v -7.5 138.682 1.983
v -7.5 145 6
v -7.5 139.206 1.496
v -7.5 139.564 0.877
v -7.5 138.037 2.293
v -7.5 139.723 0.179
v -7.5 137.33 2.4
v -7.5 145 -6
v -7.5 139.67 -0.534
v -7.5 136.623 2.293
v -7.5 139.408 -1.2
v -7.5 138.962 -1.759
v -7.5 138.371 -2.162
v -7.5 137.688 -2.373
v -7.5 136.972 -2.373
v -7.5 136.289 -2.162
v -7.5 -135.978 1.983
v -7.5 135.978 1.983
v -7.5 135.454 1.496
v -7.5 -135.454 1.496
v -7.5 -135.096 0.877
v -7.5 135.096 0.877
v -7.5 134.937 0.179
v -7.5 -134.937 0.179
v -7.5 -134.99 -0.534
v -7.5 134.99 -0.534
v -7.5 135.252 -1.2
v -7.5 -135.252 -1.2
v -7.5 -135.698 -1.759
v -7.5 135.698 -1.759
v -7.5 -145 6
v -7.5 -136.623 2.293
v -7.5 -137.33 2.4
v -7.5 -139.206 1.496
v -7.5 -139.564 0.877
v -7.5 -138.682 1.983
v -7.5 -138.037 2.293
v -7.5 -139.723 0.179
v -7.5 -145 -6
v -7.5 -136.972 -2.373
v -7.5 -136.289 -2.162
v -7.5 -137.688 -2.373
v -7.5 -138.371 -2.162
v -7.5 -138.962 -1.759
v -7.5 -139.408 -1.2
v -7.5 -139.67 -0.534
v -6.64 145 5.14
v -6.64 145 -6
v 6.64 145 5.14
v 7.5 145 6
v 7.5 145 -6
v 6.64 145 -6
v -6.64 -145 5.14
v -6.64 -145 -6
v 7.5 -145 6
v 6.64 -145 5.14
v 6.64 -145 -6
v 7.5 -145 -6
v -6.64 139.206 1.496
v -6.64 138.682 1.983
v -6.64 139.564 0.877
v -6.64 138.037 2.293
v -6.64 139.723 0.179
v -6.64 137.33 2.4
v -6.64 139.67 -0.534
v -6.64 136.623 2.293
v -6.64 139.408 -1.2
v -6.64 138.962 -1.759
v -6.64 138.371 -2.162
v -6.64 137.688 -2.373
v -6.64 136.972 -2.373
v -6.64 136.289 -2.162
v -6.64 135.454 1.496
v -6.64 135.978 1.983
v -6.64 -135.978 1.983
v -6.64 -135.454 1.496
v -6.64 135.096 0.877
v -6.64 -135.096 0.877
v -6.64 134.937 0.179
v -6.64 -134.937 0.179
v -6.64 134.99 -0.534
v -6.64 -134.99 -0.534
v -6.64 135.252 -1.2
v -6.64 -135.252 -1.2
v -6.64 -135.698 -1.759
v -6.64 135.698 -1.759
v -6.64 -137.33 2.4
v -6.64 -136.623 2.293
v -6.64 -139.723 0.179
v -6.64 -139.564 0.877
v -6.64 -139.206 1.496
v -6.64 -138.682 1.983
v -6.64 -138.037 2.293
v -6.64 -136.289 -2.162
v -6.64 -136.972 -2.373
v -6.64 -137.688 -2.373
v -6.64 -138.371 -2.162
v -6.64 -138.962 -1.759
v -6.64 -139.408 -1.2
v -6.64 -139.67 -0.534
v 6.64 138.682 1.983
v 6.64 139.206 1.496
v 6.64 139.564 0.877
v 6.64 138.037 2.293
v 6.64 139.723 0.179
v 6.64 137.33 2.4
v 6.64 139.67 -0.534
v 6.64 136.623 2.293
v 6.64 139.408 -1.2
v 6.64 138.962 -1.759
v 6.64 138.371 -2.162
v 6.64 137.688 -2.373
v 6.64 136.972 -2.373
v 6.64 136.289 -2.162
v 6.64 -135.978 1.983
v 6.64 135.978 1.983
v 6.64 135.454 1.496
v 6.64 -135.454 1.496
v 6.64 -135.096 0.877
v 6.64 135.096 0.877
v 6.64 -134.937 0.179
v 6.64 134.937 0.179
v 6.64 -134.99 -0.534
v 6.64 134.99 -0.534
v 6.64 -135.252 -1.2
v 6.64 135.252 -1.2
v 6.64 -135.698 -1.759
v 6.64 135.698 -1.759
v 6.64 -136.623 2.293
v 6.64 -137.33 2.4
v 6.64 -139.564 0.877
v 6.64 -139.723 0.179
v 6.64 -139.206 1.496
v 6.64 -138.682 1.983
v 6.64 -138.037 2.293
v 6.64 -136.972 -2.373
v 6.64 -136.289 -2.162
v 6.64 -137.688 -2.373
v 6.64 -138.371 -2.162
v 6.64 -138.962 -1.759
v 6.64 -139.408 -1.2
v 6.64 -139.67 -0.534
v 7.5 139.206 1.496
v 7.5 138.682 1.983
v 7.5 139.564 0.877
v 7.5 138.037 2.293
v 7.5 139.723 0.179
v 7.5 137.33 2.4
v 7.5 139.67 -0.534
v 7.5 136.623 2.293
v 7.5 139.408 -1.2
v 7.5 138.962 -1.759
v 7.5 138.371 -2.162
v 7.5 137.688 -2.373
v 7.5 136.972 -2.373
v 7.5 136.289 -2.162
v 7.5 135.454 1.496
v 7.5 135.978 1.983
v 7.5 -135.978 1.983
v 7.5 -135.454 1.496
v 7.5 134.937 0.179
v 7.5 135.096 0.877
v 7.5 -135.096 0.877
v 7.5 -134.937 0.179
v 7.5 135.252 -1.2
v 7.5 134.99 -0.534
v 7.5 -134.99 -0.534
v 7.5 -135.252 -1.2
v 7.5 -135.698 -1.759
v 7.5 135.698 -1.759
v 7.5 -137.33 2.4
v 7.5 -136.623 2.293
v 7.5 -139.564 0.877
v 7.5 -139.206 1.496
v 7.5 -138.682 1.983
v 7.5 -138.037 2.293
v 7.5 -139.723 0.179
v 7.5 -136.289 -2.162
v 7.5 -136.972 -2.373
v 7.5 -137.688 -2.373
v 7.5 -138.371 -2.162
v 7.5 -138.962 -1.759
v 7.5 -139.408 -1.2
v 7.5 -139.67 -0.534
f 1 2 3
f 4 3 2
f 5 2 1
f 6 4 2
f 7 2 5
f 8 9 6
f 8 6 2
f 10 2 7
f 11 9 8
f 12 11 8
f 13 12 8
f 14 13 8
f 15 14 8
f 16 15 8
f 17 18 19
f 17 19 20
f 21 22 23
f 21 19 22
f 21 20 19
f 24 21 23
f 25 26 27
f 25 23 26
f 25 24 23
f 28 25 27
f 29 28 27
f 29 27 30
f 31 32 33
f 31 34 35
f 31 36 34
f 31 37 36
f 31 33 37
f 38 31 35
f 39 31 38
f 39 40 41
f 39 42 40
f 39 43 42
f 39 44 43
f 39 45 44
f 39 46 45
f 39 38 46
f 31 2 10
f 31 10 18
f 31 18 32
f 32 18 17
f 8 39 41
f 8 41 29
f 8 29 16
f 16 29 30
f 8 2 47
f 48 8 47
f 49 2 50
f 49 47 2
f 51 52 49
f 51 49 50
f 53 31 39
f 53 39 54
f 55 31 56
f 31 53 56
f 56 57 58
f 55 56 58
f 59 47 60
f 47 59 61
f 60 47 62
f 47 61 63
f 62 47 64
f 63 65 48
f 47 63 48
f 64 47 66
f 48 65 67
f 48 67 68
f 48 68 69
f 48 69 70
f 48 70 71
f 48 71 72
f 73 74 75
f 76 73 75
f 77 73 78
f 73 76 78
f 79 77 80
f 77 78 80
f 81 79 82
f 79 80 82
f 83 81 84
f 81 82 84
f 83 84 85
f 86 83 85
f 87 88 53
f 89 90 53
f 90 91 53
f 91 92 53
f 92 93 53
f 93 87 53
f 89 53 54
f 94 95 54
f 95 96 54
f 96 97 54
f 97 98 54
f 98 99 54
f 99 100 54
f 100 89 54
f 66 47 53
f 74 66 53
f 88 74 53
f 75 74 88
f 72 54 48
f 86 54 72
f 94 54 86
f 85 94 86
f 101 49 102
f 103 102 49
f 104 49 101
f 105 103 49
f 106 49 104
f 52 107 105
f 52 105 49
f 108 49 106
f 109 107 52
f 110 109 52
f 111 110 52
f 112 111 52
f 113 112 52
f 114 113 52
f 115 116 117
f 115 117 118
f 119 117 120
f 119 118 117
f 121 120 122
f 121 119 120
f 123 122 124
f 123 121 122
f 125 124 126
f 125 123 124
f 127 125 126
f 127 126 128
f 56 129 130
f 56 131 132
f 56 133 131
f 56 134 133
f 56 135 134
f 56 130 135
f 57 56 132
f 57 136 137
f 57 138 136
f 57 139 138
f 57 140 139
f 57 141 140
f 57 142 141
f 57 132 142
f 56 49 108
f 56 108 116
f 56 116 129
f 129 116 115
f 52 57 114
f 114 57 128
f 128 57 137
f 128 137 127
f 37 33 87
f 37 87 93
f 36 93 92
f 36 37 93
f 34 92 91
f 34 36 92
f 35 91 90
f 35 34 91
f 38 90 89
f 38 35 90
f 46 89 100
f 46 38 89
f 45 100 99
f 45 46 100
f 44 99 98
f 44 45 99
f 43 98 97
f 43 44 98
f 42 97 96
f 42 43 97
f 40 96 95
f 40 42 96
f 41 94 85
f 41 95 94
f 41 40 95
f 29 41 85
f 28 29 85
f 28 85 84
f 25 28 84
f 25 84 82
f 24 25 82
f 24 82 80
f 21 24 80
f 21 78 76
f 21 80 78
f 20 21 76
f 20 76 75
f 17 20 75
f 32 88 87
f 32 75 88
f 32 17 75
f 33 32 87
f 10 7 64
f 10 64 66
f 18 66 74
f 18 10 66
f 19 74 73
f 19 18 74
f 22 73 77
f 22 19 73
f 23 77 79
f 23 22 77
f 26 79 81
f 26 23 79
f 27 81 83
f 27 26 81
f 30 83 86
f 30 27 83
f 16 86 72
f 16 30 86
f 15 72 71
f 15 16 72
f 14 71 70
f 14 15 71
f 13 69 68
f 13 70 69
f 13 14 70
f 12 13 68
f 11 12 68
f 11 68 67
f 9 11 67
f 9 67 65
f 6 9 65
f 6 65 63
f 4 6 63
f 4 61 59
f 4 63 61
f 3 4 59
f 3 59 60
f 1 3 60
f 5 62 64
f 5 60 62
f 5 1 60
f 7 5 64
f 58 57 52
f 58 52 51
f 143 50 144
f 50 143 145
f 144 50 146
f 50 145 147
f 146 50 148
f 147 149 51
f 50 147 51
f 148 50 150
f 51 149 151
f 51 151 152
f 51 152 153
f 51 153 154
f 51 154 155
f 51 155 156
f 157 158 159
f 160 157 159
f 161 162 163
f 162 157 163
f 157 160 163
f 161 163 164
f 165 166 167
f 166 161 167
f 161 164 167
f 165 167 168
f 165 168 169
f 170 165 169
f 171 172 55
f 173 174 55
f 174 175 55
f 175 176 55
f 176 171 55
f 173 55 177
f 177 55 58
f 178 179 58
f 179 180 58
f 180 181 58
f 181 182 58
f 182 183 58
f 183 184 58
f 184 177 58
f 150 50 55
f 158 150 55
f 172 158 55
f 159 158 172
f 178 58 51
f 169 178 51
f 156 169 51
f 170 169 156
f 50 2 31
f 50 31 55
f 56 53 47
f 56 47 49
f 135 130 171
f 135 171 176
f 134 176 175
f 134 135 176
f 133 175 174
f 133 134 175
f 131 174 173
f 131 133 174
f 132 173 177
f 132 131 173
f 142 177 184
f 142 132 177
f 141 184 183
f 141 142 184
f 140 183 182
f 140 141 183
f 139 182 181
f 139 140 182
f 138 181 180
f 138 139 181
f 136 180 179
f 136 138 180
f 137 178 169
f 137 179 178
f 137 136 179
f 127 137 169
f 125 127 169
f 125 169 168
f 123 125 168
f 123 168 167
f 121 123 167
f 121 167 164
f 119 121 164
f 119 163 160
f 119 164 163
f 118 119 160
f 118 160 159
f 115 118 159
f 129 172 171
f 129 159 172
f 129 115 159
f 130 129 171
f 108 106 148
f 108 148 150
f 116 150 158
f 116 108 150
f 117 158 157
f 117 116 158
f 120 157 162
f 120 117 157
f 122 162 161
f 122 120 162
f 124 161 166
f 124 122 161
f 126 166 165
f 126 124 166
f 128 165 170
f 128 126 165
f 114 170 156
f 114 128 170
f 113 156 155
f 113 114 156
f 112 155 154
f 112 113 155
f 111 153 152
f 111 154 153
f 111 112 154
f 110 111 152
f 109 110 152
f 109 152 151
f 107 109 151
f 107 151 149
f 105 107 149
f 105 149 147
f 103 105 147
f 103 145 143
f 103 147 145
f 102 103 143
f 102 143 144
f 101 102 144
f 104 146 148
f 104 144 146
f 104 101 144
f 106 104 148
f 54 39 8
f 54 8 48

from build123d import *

# Parameters (mm, degrees)
BOSS_EXTRUDE1_DEPTH      = 145
BOSS_EXTRUDE1_DEPTH_BACK = 145
SKETCH1_W                = 15
SKETCH1_H                = 12
CUT_EXTRUDE1_DEPTH       = 200
CUT_EXTRUDE1_DEPTH_BACK  = 200
SKETCH2_W                = 13.28
SKETCH2_H                = 14
CUT_EXTRUDE2_DEPTH       = 200
CUT_EXTRUDE2_DEPTH_BACK  = 200
SKETCH3_R                = 2.4


with BuildPart() as part:
    # Sketch1 → Boss-Extrude1 (new, two sides: drawn at the far end of the back side and taken through both)
    with BuildSketch(Plane(origin=(0, 0, 0), x_dir=(1, 0, 0), z_dir=(0, 1, 0)).offset(-BOSS_EXTRUDE1_DEPTH_BACK)):
        Rectangle(SKETCH1_W, SKETCH1_H)
    extrude(amount=BOSS_EXTRUDE1_DEPTH + BOSS_EXTRUDE1_DEPTH_BACK)

    # Sketch2 → Cut-Extrude1 (cut, two sides: drawn at the far end of the back side and taken through both)
    with BuildSketch(Plane(origin=(0, 0, 0), x_dir=(1, 0, 0), z_dir=(0, 1, 0)).offset(-CUT_EXTRUDE1_DEPTH_BACK)):
        with Locations((0, 1.86)):
            Rectangle(SKETCH2_W, SKETCH2_H)
    extrude(amount=CUT_EXTRUDE1_DEPTH + CUT_EXTRUDE1_DEPTH_BACK, mode=Mode.SUBTRACT)

    # Sketch3 → Cut-Extrude2 (cut, two sides: drawn at the far end of the back side and taken through both)
    with BuildSketch(Plane(origin=(0, 0, 0), x_dir=(0, 0, -1), z_dir=(1, 0, 0)).offset(-CUT_EXTRUDE2_DEPTH_BACK)):
        with Locations((0, 137.33)):
            Circle(SKETCH3_R)
        with Locations((0, -137.33)):
            Circle(SKETCH3_R)
    extrude(amount=CUT_EXTRUDE2_DEPTH + CUT_EXTRUDE2_DEPTH_BACK, mode=Mode.SUBTRACT)


solid = part.part
